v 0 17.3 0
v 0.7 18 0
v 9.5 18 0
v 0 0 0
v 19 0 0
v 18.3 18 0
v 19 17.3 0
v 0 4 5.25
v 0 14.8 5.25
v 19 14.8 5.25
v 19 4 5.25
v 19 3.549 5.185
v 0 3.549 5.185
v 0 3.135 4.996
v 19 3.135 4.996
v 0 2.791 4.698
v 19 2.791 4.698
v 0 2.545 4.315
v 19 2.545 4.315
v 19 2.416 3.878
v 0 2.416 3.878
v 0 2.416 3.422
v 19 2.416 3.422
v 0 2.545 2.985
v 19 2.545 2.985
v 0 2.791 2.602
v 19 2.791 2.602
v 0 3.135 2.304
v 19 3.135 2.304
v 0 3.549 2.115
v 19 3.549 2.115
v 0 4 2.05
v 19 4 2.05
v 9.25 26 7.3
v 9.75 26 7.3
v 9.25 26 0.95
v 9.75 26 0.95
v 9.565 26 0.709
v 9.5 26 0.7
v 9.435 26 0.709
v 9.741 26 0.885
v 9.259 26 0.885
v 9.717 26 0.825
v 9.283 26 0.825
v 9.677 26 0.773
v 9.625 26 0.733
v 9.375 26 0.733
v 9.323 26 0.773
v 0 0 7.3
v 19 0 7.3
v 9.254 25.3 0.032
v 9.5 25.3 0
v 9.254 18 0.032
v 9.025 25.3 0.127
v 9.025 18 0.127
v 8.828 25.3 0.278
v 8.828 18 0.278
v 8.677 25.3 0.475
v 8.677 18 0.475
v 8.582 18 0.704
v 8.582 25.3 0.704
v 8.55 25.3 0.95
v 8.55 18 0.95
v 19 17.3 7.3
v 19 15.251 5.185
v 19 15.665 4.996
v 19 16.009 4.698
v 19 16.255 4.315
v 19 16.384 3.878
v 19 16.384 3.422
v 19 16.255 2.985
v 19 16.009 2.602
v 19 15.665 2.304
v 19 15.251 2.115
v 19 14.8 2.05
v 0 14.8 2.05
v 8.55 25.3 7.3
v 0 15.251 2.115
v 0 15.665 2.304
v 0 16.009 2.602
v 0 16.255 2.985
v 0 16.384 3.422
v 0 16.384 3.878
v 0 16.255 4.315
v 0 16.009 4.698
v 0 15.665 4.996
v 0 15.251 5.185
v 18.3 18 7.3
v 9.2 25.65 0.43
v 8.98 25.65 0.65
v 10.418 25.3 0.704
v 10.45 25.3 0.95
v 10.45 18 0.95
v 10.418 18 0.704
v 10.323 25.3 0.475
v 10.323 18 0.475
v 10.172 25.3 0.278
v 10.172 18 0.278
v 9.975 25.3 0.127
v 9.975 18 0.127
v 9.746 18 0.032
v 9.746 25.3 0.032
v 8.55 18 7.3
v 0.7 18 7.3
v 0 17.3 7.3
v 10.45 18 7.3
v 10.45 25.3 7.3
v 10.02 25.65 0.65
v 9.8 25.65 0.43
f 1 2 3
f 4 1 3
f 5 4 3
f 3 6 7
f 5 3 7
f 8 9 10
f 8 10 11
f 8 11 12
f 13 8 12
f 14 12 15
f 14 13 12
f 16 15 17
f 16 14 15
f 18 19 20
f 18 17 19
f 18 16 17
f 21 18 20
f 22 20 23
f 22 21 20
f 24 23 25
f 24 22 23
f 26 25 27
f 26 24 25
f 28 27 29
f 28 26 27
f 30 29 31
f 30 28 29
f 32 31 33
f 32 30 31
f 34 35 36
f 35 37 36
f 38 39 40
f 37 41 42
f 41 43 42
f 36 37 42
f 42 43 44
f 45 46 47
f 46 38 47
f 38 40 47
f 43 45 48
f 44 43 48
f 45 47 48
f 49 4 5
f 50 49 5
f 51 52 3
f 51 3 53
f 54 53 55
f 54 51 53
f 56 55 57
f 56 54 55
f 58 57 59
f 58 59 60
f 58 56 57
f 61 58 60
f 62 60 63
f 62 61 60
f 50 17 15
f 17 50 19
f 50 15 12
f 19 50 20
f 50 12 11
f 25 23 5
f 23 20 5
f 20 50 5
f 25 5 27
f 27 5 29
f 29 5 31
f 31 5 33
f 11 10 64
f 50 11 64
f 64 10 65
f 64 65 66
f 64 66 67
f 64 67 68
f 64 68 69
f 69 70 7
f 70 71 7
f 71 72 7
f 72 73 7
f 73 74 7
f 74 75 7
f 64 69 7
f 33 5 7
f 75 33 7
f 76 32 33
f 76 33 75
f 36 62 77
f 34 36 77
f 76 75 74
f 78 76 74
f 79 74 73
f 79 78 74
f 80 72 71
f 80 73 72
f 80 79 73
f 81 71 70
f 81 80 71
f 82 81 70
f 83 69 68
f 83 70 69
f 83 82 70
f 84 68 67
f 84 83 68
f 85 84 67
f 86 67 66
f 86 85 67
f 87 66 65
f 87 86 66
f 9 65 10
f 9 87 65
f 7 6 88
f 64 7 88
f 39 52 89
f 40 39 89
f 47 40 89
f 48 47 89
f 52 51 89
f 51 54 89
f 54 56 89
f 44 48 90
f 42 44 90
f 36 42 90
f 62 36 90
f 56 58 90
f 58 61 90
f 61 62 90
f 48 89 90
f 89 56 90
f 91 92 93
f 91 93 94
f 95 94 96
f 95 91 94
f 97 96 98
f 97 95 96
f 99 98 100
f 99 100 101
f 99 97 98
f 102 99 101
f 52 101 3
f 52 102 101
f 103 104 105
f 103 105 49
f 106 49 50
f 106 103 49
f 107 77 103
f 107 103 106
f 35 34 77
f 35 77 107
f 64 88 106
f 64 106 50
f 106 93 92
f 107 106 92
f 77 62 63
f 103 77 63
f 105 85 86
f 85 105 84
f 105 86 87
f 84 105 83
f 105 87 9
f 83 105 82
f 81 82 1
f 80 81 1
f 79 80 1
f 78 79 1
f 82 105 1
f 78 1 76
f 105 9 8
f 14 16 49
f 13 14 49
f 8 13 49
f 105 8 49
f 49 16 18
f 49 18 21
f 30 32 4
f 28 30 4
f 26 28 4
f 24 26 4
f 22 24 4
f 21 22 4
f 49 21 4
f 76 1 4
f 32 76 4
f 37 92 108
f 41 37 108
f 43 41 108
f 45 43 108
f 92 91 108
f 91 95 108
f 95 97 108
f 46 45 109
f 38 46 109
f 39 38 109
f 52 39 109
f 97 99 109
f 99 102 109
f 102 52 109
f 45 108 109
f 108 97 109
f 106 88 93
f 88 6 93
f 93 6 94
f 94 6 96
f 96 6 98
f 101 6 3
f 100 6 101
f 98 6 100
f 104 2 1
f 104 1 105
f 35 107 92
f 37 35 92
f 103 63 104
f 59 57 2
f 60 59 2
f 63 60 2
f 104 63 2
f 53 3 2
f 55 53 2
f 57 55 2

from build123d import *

# Parameters (mm, degrees)
BOSS_EXTRUDE1_DEPTH     = 7.3
CUT_EXTRUDE1_DEPTH      = 8
CUT_EXTRUDE2_DEPTH      = 8
CUT_EXTRUDE3_DEPTH      = 34.01953967
CUT_EXTRUDE3_DEPTH_BACK = 34.01953967
CHAMFER1_SIZE           = 0.7


with BuildPart() as part:
    # Sketch1 → Boss-Extrude1 (new body)
    with BuildSketch(Plane.XY):
        Polygon((0, 0), (19, 0), (19, 18), (10.45, 18), (10.45, 26), (8.55, 26), (8.55, 18), (0, 18), align=None)
    extrude(amount=BOSS_EXTRUDE1_DEPTH)

    # Sketch2 → Cut-Extrude1 (cut)
    with BuildSketch(Plane(origin=(0, 26, 0), x_dir=(1, 0, 0), z_dir=(0, 1, 0))):
        with BuildLine():
            Line((8.55, -0.95), (8.55, 0))
            Line((8.55, 0), (9.5, 0))
            ThreePointArc((9.5, 0), (8.828248558, -0.278248558), (8.55, -0.95))
        make_face()
    extrude(amount=-CUT_EXTRUDE1_DEPTH, mode=Mode.SUBTRACT)

    # Sketch3 → Cut-Extrude2 (cut)
    with BuildSketch(Plane(origin=(0, 26, 0), x_dir=(1, 0, 0), z_dir=(0, 1, 0))):
        with BuildLine():
            Line((9.5, 0), (10.45, 0))
            Line((10.45, 0), (10.45, -0.95))
            ThreePointArc((10.45, -0.95), (10.171751442, -0.278248558), (9.5, 0))
        make_face()
    extrude(amount=-CUT_EXTRUDE2_DEPTH, mode=Mode.SUBTRACT)

    # Sketch4 → Cut-Extrude3 (cut, two sides: drawn at the far end of the back side and taken through both)
    with BuildSketch(Plane(origin=(19, 0, 0), x_dir=(0, 0, -1), z_dir=(1, 0, 0)).offset(-CUT_EXTRUDE3_DEPTH_BACK)):
        with BuildLine():
            Line((-5.25, 14.8), (-5.25, 4))
            ThreePointArc((-5.25, 4), (-3.65, 2.4), (-2.05, 4))
            Line((-2.05, 4), (-2.05, 14.8))
            ThreePointArc((-2.05, 14.8), (-3.65, 16.4), (-5.25, 14.8))
        make_face()
    extrude(amount=CUT_EXTRUDE3_DEPTH + CUT_EXTRUDE3_DEPTH_BACK, mode=Mode.SUBTRACT)

    # Chamfer1
    chamfer1_edges = [part.edges().sort_by_distance(p)[0] for p in [
        (0, 18, 3.65),
        (8.55, 26, 4.125),
        (10.45, 26, 4.125),
        (19, 18, 3.65),
        (9.5, 26, 0),
    ]]
    chamfer(chamfer1_edges, length=CHAMFER1_SIZE)


solid = part.part
